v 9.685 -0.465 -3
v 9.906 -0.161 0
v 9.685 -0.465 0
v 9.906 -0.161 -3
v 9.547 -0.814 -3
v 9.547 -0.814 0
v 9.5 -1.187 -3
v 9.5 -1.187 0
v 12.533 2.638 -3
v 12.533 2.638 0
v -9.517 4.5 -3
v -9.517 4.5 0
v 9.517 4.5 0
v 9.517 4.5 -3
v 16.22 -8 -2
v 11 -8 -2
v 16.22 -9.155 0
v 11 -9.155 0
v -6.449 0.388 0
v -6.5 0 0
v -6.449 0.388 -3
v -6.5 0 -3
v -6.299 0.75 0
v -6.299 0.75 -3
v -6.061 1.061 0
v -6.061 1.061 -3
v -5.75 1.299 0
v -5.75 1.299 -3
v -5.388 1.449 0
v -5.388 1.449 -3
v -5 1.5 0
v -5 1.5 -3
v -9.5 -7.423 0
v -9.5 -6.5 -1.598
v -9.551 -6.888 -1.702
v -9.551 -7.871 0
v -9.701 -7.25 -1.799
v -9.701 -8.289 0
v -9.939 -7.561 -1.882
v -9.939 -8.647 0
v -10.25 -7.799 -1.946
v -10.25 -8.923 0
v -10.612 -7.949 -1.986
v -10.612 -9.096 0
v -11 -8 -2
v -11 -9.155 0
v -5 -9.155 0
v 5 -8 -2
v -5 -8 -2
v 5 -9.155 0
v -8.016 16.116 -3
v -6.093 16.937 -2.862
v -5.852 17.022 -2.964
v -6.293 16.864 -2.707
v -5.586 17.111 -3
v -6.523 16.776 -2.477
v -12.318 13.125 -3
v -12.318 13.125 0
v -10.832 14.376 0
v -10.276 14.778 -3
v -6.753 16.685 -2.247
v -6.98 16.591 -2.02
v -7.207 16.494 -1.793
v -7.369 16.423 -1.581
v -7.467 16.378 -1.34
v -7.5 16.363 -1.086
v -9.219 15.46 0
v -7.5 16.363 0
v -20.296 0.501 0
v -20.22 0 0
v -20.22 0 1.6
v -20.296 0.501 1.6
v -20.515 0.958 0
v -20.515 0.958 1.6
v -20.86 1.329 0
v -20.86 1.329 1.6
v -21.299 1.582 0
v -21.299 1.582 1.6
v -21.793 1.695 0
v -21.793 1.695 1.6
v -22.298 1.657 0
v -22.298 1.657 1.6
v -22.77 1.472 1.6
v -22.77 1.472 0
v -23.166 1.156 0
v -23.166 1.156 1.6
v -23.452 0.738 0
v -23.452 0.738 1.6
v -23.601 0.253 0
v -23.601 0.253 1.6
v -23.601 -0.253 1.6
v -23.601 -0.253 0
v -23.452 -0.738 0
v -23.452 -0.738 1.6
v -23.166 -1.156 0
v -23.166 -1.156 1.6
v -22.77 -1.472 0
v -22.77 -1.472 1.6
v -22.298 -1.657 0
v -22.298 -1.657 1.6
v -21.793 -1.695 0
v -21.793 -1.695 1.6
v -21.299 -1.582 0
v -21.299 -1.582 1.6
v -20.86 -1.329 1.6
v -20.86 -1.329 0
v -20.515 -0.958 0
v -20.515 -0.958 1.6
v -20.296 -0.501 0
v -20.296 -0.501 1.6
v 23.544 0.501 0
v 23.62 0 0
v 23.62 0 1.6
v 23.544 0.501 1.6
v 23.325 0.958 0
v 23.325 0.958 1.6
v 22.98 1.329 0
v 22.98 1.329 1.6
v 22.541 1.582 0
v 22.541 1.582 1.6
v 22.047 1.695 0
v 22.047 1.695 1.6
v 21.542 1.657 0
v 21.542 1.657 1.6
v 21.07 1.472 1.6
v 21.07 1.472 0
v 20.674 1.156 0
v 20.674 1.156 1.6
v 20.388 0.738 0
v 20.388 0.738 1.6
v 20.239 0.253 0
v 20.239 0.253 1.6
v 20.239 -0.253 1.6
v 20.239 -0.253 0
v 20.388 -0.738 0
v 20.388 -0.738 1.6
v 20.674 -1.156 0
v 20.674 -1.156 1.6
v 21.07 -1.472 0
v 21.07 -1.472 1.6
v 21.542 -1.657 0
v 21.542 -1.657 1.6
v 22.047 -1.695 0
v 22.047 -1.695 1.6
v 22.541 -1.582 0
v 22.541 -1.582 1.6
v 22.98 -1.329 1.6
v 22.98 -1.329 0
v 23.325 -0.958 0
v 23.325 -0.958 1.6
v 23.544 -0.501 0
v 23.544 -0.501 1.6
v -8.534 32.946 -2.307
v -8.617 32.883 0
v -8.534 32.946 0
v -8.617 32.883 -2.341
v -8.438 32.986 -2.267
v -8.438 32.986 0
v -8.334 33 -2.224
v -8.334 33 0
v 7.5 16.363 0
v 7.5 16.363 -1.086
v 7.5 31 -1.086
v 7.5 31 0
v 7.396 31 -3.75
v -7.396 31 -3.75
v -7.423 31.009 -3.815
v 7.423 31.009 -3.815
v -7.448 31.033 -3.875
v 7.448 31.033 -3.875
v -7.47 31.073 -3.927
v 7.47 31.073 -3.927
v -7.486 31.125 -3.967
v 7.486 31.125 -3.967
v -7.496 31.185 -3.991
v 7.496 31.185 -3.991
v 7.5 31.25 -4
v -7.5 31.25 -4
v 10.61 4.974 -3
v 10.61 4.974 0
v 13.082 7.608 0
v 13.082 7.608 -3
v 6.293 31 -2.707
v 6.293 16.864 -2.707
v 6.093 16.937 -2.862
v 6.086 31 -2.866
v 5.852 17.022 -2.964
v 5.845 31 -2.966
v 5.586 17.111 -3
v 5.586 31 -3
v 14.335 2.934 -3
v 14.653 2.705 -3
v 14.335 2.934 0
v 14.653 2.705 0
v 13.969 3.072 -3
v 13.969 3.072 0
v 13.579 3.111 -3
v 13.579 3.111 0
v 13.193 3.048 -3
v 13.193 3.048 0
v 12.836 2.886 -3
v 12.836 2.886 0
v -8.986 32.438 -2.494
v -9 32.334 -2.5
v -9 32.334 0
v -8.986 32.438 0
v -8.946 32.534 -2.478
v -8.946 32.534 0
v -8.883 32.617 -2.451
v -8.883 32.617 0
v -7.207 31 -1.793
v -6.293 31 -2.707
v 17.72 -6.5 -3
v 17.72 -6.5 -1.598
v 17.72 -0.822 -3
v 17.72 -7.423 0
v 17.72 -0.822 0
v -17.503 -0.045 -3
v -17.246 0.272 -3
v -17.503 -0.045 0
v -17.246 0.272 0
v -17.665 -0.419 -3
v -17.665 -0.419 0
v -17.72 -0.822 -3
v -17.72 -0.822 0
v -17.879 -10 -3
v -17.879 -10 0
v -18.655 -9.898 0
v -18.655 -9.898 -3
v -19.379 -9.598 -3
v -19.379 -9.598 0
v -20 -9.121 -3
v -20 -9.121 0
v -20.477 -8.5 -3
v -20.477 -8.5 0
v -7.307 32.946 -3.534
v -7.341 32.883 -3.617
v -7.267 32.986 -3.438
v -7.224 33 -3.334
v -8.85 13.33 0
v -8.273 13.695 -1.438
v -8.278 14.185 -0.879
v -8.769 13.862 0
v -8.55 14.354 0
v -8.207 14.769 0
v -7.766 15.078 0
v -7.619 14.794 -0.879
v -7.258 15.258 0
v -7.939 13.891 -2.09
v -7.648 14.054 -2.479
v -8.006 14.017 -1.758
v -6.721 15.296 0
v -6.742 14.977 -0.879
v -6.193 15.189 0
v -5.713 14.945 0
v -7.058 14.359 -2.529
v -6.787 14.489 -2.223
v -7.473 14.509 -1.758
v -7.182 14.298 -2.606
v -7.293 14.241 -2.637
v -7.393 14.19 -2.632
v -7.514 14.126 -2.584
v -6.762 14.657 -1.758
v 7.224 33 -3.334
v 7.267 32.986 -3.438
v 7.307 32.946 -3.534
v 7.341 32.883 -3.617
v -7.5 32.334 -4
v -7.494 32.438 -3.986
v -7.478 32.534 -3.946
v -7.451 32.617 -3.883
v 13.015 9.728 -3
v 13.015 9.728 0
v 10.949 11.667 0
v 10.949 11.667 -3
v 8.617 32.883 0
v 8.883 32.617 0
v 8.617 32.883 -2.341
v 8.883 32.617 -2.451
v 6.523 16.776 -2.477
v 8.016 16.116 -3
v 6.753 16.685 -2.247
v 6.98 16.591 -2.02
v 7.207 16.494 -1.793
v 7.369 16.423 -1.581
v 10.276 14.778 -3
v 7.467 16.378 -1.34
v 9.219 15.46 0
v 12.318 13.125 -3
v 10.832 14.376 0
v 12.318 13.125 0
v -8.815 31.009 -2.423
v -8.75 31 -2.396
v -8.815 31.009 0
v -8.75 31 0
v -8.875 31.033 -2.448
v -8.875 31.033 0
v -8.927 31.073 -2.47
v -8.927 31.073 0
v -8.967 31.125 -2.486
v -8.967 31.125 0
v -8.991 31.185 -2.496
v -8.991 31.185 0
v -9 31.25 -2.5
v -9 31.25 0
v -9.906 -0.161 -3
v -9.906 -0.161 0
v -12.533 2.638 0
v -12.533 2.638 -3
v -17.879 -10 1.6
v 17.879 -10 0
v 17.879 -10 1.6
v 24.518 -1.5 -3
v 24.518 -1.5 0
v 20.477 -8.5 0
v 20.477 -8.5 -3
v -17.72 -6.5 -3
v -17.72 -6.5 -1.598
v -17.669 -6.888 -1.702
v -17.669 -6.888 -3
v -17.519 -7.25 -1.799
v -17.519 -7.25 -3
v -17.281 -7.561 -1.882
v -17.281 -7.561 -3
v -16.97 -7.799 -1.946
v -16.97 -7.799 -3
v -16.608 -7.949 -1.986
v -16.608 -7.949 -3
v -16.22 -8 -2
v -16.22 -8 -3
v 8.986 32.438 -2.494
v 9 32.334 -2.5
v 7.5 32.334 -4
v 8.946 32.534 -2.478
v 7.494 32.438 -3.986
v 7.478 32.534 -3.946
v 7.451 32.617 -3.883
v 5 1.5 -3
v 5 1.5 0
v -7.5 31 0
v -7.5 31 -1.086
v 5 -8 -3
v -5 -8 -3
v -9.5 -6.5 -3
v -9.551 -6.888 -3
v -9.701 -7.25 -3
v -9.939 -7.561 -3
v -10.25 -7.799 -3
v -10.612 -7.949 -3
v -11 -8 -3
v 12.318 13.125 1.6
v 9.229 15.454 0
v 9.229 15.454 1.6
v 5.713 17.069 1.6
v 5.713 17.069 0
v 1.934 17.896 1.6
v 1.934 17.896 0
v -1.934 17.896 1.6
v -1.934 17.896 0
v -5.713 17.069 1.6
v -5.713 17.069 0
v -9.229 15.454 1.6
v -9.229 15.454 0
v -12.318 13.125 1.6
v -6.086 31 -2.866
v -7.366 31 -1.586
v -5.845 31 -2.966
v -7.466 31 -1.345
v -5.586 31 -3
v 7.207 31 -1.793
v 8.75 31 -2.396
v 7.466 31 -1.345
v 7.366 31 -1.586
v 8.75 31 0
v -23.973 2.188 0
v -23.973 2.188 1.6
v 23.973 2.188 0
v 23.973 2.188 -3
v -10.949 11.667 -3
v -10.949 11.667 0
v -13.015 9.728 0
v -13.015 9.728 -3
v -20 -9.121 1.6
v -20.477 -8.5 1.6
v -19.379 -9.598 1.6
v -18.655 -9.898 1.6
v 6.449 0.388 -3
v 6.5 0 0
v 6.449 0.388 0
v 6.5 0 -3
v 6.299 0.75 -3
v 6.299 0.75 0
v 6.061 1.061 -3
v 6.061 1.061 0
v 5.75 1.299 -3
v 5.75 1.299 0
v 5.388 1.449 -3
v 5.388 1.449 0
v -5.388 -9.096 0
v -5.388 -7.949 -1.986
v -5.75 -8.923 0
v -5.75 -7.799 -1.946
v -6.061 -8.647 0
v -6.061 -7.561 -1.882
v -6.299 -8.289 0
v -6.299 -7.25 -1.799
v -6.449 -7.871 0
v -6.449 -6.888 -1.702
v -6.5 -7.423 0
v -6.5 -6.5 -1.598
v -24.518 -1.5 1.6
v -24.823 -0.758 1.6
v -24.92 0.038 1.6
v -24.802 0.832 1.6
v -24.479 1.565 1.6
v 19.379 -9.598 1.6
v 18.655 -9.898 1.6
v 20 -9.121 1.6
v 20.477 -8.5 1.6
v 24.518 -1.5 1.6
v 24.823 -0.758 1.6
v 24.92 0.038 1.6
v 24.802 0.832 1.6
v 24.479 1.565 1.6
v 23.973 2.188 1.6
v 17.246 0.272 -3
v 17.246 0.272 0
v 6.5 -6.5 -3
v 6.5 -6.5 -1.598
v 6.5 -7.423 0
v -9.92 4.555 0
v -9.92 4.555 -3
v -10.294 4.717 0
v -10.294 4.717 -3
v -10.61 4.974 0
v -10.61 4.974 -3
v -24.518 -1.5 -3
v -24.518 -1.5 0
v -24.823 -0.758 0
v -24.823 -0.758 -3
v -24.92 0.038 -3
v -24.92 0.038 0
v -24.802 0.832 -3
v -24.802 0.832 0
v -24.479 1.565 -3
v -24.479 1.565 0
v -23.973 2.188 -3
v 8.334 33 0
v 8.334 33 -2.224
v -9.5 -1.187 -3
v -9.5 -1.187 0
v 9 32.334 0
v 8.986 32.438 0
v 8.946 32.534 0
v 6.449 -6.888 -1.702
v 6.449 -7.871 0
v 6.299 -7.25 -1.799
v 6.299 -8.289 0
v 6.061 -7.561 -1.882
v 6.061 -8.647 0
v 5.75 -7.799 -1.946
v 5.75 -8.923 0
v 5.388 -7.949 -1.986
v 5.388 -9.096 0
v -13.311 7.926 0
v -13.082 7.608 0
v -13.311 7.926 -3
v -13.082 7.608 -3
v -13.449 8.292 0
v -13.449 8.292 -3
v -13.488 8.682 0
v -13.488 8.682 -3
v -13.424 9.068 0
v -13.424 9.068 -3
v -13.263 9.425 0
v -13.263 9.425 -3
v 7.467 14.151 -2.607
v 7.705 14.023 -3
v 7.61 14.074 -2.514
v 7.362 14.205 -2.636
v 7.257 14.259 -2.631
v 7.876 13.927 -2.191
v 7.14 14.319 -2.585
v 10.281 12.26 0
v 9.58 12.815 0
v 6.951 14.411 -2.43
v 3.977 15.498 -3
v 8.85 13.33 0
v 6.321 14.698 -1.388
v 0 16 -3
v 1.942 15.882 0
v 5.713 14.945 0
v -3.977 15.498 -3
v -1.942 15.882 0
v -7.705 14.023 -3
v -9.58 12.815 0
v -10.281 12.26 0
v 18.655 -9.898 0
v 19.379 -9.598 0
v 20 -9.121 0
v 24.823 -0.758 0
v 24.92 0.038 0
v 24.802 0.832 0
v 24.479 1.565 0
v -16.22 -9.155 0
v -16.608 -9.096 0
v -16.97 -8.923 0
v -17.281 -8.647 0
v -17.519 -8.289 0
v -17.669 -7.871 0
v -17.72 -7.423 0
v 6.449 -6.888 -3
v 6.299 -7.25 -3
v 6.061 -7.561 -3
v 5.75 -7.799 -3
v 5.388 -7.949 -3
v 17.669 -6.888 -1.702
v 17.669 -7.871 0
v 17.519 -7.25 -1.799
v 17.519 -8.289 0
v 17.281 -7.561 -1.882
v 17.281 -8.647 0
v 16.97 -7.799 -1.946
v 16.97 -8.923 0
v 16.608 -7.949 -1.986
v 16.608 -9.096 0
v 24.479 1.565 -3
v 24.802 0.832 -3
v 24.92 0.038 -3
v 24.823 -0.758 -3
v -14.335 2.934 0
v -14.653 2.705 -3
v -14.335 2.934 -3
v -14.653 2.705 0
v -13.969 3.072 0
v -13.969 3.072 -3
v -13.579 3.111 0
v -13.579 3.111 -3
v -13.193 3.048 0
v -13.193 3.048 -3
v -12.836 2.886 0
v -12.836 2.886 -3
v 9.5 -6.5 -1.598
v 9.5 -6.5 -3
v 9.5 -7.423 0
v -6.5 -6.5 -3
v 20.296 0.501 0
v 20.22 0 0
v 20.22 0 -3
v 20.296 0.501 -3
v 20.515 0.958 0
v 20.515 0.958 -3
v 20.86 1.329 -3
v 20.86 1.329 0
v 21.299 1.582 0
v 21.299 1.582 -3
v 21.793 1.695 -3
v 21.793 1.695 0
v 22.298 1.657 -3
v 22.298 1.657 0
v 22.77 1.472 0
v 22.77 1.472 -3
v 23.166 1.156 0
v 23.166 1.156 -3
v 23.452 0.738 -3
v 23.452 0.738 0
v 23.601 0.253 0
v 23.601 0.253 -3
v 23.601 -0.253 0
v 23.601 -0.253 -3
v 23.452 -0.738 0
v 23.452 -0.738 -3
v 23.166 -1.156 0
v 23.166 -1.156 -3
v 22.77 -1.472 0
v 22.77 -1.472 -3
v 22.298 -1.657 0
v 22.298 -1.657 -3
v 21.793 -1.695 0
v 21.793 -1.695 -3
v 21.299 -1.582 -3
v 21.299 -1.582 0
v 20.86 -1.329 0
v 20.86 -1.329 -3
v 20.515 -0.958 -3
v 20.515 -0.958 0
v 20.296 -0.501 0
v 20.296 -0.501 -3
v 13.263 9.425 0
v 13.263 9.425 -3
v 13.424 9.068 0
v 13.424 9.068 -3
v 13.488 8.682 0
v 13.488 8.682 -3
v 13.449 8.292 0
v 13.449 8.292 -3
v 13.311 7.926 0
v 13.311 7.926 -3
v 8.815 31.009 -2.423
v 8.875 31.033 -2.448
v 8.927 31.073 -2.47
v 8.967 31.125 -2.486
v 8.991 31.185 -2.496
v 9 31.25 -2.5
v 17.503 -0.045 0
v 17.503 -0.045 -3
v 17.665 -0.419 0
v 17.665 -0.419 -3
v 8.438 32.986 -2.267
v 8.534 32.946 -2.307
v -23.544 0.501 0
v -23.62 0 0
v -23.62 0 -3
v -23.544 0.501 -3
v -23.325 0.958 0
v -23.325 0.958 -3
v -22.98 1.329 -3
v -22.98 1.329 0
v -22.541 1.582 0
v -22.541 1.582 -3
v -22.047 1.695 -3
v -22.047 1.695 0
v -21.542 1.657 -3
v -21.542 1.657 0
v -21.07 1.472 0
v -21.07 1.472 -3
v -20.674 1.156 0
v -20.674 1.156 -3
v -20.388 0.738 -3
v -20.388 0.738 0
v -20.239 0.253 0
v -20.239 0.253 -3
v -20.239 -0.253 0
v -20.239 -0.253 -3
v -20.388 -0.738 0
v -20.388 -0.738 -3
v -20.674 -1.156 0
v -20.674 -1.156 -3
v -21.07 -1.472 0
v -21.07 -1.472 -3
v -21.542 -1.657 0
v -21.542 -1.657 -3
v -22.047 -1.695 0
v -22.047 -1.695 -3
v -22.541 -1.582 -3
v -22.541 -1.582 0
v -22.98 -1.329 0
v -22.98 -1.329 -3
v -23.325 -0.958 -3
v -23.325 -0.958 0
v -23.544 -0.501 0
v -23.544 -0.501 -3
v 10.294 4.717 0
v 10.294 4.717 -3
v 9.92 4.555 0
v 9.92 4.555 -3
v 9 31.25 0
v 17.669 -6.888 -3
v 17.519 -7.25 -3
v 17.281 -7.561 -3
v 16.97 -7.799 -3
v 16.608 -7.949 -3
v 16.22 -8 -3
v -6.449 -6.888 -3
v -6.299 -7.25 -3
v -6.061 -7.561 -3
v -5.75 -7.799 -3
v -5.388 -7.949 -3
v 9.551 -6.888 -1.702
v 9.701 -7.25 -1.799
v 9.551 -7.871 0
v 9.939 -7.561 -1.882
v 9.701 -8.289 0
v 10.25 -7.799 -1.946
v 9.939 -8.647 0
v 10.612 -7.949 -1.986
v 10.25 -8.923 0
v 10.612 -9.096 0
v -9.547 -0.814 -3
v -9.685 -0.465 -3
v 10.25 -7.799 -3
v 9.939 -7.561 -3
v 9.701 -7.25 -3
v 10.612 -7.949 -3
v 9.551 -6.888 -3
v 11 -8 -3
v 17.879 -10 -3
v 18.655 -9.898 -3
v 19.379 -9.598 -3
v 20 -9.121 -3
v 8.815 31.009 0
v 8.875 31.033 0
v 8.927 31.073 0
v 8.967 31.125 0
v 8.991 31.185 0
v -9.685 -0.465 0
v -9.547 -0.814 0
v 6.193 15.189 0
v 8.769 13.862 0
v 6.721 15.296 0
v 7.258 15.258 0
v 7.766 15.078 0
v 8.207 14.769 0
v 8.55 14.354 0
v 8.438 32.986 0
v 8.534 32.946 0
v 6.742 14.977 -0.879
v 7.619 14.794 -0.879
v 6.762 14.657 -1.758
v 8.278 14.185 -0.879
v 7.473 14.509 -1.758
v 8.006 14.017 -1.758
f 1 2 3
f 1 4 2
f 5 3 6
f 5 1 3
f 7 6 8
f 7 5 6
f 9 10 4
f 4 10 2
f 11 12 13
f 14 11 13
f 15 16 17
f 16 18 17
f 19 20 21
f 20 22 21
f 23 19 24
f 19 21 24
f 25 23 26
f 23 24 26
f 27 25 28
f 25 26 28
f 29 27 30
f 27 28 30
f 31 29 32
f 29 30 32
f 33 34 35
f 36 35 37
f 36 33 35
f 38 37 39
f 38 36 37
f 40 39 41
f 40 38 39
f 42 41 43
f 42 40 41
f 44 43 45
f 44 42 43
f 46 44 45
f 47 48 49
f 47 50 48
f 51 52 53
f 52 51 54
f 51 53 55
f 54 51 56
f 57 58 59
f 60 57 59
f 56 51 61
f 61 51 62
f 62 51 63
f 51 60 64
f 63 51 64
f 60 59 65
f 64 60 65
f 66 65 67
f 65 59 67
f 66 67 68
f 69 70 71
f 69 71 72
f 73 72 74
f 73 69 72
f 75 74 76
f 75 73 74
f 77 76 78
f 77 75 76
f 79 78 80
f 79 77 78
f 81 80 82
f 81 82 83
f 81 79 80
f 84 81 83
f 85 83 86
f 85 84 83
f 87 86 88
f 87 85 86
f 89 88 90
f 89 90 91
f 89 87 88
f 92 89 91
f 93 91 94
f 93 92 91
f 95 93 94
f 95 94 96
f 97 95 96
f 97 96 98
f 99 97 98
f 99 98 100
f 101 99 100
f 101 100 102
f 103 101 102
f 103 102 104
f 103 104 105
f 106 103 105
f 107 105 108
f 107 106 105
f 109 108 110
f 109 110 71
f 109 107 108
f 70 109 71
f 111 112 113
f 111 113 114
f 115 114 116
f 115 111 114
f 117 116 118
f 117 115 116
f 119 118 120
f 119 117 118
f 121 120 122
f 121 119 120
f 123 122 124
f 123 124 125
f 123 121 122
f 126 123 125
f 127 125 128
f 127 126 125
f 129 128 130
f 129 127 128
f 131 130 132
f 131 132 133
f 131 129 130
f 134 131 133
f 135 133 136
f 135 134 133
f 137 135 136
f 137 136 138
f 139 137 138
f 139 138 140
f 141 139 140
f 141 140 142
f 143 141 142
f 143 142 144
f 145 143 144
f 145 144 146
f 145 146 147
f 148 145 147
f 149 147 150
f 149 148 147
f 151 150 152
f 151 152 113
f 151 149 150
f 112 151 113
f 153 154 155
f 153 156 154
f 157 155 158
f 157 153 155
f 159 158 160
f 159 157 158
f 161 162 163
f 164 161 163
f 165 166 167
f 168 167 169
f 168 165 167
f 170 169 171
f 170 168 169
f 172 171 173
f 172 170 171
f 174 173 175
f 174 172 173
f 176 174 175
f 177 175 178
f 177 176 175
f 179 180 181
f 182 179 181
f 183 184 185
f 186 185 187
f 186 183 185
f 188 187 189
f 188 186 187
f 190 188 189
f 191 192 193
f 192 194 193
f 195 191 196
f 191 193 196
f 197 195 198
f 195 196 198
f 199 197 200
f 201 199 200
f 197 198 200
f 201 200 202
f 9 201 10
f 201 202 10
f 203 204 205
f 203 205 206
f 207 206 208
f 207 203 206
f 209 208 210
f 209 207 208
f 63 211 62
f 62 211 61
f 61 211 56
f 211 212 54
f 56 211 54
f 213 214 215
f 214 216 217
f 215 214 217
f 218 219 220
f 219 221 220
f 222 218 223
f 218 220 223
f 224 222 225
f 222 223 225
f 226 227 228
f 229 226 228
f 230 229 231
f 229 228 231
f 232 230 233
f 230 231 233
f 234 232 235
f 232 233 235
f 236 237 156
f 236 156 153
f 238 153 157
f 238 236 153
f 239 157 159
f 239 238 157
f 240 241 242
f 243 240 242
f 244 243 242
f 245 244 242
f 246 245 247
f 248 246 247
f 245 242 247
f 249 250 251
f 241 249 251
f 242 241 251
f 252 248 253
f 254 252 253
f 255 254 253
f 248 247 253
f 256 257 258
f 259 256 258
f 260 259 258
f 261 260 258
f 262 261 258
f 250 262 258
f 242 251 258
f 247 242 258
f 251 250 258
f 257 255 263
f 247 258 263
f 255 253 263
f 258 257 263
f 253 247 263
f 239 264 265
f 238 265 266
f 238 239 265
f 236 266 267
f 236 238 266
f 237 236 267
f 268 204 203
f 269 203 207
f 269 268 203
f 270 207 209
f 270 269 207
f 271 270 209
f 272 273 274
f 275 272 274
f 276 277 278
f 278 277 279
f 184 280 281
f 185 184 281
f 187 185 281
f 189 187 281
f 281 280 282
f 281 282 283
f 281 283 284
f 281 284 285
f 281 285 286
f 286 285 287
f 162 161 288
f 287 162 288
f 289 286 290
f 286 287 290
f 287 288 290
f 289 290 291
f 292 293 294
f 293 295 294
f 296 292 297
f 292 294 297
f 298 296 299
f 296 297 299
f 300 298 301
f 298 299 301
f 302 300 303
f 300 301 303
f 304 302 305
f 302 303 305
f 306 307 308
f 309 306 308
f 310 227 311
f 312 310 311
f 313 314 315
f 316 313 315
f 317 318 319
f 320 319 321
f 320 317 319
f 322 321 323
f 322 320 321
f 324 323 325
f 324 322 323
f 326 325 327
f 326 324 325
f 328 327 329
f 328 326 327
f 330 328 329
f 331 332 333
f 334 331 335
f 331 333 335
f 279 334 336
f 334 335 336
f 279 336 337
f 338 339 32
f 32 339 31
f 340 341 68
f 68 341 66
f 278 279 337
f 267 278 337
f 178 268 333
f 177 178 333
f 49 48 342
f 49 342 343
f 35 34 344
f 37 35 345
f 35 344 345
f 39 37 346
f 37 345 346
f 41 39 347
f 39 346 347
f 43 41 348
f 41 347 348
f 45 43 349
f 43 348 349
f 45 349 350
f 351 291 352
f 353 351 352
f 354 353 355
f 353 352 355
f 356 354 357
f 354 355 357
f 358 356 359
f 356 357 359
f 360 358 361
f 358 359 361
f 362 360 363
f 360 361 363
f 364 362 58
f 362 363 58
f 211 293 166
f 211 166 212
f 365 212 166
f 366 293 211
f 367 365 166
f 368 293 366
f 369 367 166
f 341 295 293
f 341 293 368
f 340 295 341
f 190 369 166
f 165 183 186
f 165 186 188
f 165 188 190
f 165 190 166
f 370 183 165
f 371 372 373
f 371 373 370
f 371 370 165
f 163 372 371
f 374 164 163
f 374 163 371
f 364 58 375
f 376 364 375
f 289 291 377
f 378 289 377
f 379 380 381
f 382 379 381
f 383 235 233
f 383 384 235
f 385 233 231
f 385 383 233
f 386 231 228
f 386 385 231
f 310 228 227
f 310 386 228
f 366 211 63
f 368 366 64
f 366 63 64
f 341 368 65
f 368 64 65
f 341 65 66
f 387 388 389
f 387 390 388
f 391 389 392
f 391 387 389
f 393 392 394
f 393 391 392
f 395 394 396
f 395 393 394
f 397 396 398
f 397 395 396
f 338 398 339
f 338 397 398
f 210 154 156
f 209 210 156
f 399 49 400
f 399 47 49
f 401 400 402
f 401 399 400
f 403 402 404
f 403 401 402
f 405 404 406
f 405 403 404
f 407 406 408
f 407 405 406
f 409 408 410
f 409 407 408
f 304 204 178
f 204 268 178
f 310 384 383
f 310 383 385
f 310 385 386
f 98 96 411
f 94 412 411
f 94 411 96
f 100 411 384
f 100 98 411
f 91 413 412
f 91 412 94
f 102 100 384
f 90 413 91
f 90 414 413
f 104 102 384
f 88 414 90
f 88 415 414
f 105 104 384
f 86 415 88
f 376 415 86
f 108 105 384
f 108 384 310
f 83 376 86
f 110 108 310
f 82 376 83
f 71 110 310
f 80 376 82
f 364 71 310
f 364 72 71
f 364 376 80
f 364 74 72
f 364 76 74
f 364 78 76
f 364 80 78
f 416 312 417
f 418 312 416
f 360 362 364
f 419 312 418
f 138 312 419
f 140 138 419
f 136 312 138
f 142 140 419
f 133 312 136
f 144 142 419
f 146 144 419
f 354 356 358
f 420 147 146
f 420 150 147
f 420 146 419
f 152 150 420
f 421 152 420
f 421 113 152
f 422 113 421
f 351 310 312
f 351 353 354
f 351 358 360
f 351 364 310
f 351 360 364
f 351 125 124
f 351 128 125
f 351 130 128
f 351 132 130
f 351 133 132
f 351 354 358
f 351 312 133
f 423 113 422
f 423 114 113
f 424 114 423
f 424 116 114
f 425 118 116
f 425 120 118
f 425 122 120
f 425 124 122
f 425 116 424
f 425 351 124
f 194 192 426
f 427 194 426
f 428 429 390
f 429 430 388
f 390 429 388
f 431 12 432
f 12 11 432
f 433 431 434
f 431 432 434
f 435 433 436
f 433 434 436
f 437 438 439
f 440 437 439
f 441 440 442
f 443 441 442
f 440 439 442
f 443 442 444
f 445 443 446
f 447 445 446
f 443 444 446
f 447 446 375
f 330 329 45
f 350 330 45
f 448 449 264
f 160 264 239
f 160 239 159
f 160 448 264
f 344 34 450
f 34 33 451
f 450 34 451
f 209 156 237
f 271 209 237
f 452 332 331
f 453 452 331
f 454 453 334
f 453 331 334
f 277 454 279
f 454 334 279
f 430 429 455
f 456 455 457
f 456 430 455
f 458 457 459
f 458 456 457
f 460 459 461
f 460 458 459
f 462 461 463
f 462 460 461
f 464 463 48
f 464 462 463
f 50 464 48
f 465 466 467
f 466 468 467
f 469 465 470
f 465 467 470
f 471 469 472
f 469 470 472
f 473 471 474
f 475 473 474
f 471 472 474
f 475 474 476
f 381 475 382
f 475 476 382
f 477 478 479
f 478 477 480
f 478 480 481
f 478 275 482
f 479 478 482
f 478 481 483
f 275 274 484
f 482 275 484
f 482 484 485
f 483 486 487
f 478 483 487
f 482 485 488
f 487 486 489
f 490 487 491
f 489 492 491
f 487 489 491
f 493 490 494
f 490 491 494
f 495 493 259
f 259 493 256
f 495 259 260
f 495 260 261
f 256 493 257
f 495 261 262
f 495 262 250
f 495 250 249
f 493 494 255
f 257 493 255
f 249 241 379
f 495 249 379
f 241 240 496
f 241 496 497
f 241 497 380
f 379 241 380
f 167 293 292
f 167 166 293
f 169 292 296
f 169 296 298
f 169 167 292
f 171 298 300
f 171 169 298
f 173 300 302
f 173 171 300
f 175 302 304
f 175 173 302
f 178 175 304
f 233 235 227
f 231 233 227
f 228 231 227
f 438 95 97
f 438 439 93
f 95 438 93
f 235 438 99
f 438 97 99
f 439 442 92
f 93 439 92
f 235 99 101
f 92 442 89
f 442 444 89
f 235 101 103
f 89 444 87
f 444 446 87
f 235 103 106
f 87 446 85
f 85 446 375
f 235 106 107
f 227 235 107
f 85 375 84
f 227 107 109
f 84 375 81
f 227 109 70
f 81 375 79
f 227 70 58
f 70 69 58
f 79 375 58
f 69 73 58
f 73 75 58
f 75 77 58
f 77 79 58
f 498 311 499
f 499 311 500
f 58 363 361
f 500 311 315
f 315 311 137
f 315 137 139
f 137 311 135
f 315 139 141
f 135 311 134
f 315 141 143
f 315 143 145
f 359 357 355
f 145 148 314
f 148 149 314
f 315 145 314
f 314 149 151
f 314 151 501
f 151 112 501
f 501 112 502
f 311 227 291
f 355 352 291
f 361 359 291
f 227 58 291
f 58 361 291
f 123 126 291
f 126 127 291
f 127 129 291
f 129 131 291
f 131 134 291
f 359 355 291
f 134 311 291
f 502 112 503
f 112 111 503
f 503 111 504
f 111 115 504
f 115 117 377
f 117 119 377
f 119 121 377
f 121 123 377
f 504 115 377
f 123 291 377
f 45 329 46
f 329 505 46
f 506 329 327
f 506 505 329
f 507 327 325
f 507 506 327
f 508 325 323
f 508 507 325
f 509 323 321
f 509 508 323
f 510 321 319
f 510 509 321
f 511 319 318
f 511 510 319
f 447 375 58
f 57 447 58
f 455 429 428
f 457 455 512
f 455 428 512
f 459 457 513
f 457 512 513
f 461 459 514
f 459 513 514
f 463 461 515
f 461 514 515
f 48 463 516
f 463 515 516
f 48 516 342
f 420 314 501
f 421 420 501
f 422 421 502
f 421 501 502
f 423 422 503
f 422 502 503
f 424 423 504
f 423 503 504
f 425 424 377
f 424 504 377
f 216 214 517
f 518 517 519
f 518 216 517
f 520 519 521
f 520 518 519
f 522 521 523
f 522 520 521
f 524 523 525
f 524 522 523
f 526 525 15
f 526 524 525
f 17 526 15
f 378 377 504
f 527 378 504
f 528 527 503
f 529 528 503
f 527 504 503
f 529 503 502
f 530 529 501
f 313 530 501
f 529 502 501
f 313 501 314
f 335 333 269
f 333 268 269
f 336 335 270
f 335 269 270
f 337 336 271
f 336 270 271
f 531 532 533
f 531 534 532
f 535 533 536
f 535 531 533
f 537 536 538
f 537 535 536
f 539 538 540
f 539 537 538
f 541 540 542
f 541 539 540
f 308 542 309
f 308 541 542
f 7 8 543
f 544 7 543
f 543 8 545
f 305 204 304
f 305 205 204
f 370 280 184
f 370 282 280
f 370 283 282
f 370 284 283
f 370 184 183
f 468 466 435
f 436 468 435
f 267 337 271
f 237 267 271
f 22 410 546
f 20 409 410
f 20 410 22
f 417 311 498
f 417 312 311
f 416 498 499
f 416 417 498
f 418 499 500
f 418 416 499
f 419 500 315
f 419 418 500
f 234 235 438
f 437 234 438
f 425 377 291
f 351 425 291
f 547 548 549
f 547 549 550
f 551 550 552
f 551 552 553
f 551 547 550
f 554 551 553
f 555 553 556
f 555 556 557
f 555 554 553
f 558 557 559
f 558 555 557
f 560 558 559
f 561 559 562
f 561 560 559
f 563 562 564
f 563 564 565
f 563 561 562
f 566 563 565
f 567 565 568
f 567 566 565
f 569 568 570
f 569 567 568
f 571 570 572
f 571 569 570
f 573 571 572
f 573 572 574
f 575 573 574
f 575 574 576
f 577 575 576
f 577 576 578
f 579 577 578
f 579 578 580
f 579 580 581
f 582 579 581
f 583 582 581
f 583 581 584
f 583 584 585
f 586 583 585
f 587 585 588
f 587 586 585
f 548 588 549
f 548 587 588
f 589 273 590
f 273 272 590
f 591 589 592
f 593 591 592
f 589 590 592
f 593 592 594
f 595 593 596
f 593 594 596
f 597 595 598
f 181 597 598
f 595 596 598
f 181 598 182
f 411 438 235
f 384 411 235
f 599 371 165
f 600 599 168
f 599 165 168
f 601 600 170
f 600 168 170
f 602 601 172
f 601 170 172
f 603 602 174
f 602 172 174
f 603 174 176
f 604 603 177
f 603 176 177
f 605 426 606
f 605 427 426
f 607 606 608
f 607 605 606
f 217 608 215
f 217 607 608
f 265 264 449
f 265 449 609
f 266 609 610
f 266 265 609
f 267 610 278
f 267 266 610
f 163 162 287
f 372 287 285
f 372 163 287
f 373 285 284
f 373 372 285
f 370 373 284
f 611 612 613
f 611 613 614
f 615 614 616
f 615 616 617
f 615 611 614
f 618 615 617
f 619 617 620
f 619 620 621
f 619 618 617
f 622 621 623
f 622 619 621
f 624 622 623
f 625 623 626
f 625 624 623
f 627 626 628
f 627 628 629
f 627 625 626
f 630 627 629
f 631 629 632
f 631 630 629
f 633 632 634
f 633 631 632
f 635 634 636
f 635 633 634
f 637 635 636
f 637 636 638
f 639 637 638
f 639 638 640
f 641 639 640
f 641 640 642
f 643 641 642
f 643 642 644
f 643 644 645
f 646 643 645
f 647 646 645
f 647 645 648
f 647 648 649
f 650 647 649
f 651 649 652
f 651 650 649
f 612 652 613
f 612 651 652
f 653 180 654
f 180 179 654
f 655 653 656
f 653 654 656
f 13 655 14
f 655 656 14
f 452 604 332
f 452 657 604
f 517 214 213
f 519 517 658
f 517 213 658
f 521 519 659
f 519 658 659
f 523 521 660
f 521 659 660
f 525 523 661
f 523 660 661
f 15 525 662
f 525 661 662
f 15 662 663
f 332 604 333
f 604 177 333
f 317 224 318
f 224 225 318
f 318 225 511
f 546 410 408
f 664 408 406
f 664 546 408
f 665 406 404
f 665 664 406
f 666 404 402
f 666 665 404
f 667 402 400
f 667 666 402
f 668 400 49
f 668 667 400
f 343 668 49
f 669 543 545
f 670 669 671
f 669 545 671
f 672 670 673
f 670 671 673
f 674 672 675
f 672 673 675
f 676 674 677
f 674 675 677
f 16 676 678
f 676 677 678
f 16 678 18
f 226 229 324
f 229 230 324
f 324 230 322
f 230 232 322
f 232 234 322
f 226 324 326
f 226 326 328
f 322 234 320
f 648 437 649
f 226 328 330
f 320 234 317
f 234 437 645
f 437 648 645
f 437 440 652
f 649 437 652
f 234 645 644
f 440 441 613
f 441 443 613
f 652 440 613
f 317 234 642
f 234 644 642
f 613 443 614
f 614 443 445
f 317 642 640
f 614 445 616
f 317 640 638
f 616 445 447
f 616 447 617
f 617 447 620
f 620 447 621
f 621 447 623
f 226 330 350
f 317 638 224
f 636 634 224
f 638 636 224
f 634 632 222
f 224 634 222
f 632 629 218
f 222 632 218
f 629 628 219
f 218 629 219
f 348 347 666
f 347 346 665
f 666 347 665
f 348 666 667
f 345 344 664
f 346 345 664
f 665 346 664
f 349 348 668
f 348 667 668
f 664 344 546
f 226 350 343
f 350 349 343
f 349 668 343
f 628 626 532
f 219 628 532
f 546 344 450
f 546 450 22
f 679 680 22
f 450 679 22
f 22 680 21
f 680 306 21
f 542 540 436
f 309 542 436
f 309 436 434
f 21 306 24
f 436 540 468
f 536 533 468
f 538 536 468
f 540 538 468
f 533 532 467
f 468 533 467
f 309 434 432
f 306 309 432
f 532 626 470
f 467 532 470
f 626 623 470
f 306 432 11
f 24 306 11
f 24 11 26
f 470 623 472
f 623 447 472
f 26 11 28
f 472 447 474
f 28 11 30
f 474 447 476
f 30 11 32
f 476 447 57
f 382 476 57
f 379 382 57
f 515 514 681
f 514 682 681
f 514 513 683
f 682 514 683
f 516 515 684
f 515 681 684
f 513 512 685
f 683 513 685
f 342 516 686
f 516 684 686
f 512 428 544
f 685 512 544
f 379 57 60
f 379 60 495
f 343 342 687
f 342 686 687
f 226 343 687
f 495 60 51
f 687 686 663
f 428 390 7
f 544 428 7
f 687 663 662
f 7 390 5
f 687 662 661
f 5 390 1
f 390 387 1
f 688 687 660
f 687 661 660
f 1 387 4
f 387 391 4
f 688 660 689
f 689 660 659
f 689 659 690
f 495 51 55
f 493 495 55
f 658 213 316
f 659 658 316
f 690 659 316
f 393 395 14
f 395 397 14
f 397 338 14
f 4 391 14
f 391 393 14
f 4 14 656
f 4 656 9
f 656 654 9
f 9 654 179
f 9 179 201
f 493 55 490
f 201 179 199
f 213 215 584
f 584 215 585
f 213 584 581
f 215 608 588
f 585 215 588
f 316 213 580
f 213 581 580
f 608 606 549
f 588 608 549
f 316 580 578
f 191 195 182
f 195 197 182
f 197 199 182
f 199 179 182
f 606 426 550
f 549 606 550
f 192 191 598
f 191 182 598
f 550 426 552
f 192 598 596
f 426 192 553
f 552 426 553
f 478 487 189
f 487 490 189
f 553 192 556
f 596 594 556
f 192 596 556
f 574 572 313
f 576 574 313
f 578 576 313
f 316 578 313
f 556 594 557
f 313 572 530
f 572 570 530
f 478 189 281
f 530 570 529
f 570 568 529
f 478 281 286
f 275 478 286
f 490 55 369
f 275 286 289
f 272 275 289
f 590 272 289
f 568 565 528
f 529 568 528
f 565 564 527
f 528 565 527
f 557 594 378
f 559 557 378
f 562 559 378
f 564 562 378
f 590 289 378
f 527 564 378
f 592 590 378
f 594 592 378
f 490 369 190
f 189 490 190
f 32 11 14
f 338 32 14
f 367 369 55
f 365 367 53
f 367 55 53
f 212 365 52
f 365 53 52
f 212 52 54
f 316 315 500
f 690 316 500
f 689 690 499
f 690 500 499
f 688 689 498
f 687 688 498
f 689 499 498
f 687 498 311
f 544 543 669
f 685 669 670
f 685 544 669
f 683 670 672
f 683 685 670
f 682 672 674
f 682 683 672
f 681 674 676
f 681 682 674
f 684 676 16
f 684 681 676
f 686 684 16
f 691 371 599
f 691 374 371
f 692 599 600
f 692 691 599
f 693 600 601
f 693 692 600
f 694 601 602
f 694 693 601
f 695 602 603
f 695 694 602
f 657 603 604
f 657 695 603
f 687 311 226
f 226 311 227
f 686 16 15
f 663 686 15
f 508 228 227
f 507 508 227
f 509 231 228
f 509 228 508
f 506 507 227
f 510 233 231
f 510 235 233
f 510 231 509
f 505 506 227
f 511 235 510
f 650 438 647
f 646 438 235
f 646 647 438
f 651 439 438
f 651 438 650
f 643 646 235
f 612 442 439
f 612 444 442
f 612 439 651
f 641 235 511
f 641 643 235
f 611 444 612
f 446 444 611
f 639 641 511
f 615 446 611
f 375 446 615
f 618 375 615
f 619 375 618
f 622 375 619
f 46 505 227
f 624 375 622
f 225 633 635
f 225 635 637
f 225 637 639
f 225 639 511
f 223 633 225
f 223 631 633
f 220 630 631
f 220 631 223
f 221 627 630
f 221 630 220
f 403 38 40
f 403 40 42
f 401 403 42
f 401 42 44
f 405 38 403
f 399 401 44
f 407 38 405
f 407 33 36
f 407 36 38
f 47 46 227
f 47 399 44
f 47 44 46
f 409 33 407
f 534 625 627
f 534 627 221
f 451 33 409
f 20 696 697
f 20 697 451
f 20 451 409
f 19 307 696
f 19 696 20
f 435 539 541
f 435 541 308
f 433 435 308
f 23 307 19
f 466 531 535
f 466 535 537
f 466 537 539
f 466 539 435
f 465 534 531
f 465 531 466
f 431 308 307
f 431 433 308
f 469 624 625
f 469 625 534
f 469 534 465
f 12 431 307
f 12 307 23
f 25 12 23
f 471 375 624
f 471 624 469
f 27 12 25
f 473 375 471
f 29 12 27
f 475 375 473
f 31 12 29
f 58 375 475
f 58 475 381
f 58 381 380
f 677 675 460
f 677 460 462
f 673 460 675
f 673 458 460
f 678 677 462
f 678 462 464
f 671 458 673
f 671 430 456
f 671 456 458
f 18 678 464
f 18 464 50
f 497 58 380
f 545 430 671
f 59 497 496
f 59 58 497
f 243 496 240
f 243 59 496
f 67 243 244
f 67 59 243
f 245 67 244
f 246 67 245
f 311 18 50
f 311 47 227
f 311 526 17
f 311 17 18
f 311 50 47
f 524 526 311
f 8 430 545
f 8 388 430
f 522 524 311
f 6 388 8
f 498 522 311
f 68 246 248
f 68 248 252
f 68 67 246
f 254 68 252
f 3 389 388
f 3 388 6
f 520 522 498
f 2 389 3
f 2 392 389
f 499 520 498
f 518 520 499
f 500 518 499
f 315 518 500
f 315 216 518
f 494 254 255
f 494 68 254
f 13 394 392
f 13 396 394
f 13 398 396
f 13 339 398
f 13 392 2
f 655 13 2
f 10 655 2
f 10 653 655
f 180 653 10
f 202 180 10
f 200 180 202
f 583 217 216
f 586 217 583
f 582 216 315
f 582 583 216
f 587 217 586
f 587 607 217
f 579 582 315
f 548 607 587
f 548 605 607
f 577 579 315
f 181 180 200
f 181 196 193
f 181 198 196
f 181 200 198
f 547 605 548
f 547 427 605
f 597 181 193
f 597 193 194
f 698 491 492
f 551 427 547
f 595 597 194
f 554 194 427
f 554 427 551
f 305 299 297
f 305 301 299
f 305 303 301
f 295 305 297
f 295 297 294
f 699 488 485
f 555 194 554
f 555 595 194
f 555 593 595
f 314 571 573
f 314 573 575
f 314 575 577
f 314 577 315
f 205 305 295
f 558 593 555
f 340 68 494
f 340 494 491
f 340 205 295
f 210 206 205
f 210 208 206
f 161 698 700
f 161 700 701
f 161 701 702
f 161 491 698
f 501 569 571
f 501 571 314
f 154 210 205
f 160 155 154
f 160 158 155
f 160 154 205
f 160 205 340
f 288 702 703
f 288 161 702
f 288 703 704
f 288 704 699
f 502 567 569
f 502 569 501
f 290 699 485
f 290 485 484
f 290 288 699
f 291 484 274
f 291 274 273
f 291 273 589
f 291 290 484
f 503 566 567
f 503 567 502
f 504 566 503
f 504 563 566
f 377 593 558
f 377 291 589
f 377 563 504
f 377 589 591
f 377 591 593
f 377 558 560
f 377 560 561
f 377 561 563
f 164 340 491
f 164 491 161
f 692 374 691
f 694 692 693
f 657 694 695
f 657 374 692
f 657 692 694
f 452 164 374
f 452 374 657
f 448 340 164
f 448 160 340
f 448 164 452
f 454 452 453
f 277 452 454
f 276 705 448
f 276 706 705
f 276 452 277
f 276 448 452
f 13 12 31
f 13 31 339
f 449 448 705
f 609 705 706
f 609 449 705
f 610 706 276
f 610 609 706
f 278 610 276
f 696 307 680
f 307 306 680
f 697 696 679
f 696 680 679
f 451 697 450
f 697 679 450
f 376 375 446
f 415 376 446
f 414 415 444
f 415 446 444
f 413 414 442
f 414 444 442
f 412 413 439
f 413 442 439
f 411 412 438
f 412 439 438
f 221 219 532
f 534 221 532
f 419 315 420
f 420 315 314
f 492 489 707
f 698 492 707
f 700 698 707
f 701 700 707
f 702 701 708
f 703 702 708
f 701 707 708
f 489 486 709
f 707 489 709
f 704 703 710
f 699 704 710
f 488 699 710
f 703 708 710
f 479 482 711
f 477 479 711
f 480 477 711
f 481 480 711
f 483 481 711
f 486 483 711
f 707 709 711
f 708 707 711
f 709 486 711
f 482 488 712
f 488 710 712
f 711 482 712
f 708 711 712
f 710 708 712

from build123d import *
from OCP.BRepFilletAPI import BRepFilletAPI_MakeChamfer

# Parameters (mm, degrees)
SKETCH1_R           = 1.7
BOSS_EXTRUDE1_DEPTH = 1.6
FILLET3_R           = 3
SKETCH2_R           = 1.7
SKETCH2_W           = 13
SKETCH2_H           = 9.5
BOSS_EXTRUDE2_DEPTH = 3
CHAMFER1_SIZE       = 2
CHAMFER1_SIZE2      = 1.154700538
MOVE_START          = -3
MOVE_FACE2_DEPTH    = 3
MOVE_FACE3_DEPTH    = 3
FILLET2_R           = 1.5
BOSS_EXTRUDE3_START = -3
BOSS_EXTRUDE3_DEPTH = 3
BOSS_EXTRUDE4_START = -3
BOSS_EXTRUDE4_DEPTH = 1
CHAMFER6_SIZE       = 1.5
CHAMFER3_SIZE       = 0.5
FILLET6_R           = 0.4
CHAMFER5_SIZE       = 1.5
FILLET7_R           = 1
FILLET8_R           = 0.25


# Read off the part's stored shape, not the designer's step: Move Face2, Move Face3
with BuildPart() as part:
    # Sketch1 → Boss-Extrude1 (new body)
    with BuildSketch(Plane.XY):
        with BuildLine():
            Line((-12.317518248, 13.12549977), (-23.972919708, 2.187583295))
            ThreePointArc((-23.972919708, 2.187583295), (-24.887744666, 0.438738647), (-24.518076211, -1.5))
            Line((-24.518076211, -1.5), (-19.610598923, -10))
            Line((-19.610598923, -10), (19.610598923, -10))
            Line((19.610598923, -10), (24.518076211, -1.5))
            ThreePointArc((24.518076211, -1.5), (24.887744666, 0.438738647), (23.972919708, 2.187583295))
            Line((23.972919708, 2.187583295), (12.317518248, 13.12549977))
            ThreePointArc((12.317518248, 13.12549977), (0, 18), (-12.317518248, 13.12549977))
        make_face()
        with Locations((-21.92, 0)):
            Circle(SKETCH1_R, mode=Mode.SUBTRACT)
        with Locations((21.92, 0)):
            Circle(SKETCH1_R, mode=Mode.SUBTRACT)
    extrude(amount=BOSS_EXTRUDE1_DEPTH)

    # Fillet3
    fillet3_edges = [part.edges().sort_by_distance(p)[0] for p in [
        (19.610598923, -10, 0.8),
        (-19.610598923, -10, 0.8),
    ]]
    fillet(fillet3_edges, radius=FILLET3_R)


with BuildPart() as body_2:
    # Sketch2 → Boss-Extrude2 (new body)
    with BuildSketch(Plane(origin=(0, 0, 0), x_dir=(-1, 0, 0), z_dir=(0, 0, -1))):
        with BuildLine():
            ThreePointArc((-20.476624327, -8.5), (-19.378548116, -9.598076211), (-17.878548116, -10))
            Line((-17.878548116, -10), (17.878548116, -10))
            ThreePointArc((17.878548116, -10), (19.378548116, -9.598076211), (20.476624327, -8.5))
            Line((20.476624327, -8.5), (24.518076211, -1.5))
            ThreePointArc((24.518076211, -1.5), (24.887744666, 0.438738647), (23.972919708, 2.187583295))
            Line((23.972919708, 2.187583295), (12.317518248, 13.12549977))
            ThreePointArc((12.317518248, 13.12549977), (0, 18), (-12.317518248, 13.12549977))
            Line((-12.317518248, 13.12549977), (-23.972919708, 2.187583295))
            ThreePointArc((-23.972919708, 2.187583295), (-24.887744666, 0.438738647), (-24.518076211, -1.5))
            Line((-24.518076211, -1.5), (-20.476624327, -8.5))
        make_face()
        with BuildLine():
            Line((10.165923783, 4.5), (-10.165923783, 4.5))
            Line((-10.165923783, 4.5), (-14.108909615, 8.701630441))
            Line((-14.108909615, 8.701630441), (-10.948905109, 11.667110906))
            ThreePointArc((-10.948905109, 11.667110906), (0, 16), (10.948905109, 11.667110906))
            Line((10.948905109, 11.667110906), (14.108909615, 8.701630441))
            Line((14.108909615, 8.701630441), (10.165923783, 4.5))
        make_face(mode=Mode.SUBTRACT)
        with BuildLine():
            Line((-16.29649291, 6.648710733), (-9.5, -0.593605806))
            Line((-9.5, -0.593605806), (-9.5, -8))
            Line((-9.5, -8), (-17.72, -8))
            Line((-17.72, -8), (-17.72, 0))
            ThreePointArc((-17.72, 0), (-18.228185683, 2.002625039), (-19.62976526, 3.520628472))
            Line((-19.62976526, 3.520628472), (-16.29649291, 6.648710733))
        make_face(mode=Mode.SUBTRACT)
        with BuildLine():
            Line((17.72, -8), (9.5, -8))
            Line((9.5, -8), (9.5, -0.593605806))
            Line((9.5, -0.593605806), (16.29649291, 6.648710733))
            Line((16.29649291, 6.648710733), (19.62976526, 3.520628472))
            ThreePointArc((19.62976526, 3.520628472), (18.228185683, 2.002625039), (17.72, 0))
            Line((17.72, 0), (17.72, -8))
        make_face(mode=Mode.SUBTRACT)
        with Locations((21.92, 0)):
            Circle(SKETCH2_R, mode=Mode.SUBTRACT)
        with Locations((0, -3.25)):
            Rectangle(SKETCH2_W, SKETCH2_H, mode=Mode.SUBTRACT)
        with Locations((-21.92, 0)):
            Circle(SKETCH2_R, mode=Mode.SUBTRACT)
    extrude(amount=BOSS_EXTRUDE2_DEPTH)

    # Cut-Extrude1 cone 1 section (through the dimple's axis) → Cut-Extrude1 (revolve, cut)
    with BuildSketch(Plane(origin=(-6.85, 13.3, 0), x_dir=(0, -1, 0), z_dir=(1, 0, 0))):
        Polygon((0, 0), (2, 0), (0, 5.494954839), align=None)
    revolve(axis=Axis((-6.85, 13.3, 0), (0, 0, -1)), mode=Mode.SUBTRACT)

    # Cut-Extrude1 cone 2 section (through the dimple's axis) → Cut-Extrude1 cone 2 (revolve, cut)
    with BuildSketch(Plane(origin=(6.85, 13.3, 0), x_dir=(0, -1, 0), z_dir=(1, 0, 0))):
        Polygon((0, 0), (2, 0), (0, 5.494954839), align=None)
    revolve(axis=Axis((6.85, 13.3, 0), (0, 0, -1)), mode=Mode.SUBTRACT)

    # Chamfer1: one chamfer whose edges measure the first distance from different faces: ONE call of the kernel's chamfer builder (chamfer() names one face for all edges)
    chamfer1_edges_1 = [body_2.edges().sort_by_distance(p)[0] for p in [
        (-13.61, -8, 0),
    ]]
    chamfer1_side_1 = [body_2.faces().sort_by_distance(p)[0] for p in [
        (-13.61, -8, -1.5),
    ]]
    chamfer1_edges_2 = [body_2.edges().sort_by_distance(p)[0] for p in [
        (0, -8, 0),
    ]]
    chamfer1_side_2 = [body_2.faces().sort_by_distance(p)[0] for p in [
        (0, -8, -1.5),
    ]]
    chamfer1_edges_3 = [body_2.edges().sort_by_distance(p)[0] for p in [
        (13.61, -8, 0),
    ]]
    chamfer1_side_3 = [body_2.faces().sort_by_distance(p)[0] for p in [
        (13.61, -8, -1.5),
    ]]
    chamfer1 = BRepFilletAPI_MakeChamfer(body_2.part.solid().wrapped)
    for e in chamfer1_edges_1:
        chamfer1.Add(CHAMFER1_SIZE, CHAMFER1_SIZE2, e.wrapped, chamfer1_side_1[0].wrapped)  # the first distance lies on this face
    for e in chamfer1_edges_2:
        chamfer1.Add(CHAMFER1_SIZE, CHAMFER1_SIZE2, e.wrapped, chamfer1_side_2[0].wrapped)  # the first distance lies on this face
    for e in chamfer1_edges_3:
        chamfer1.Add(CHAMFER1_SIZE, CHAMFER1_SIZE2, e.wrapped, chamfer1_side_3[0].wrapped)  # the first distance lies on this face
    add(Compound.cast(chamfer1.Shape()), mode=Mode.REPLACE)

    # Move Face2 outline → Move Face2 (add)
    with BuildSketch(Plane.XY.offset(MOVE_START)):
        with BuildLine():
            Line((-17.72, 0), (-17.72, -0.1726733))
            Line((-17.72, -0.1726733), (-13.559266633, 3.731933007))
            Line((-13.559266633, 3.731933007), (-16.29649291, 6.648710733))
            Line((-16.29649291, 6.648710733), (-19.62976526, 3.520628472))
            ThreePointArc((-19.62976526, 3.520628472), (-18.228185683, 2.002625039), (-17.72, 0))
        make_face()
    extrude(amount=MOVE_FACE2_DEPTH)

    # Move Face3 outline → Move Face3 (add)
    with BuildSketch(Plane.XY.offset(MOVE_START)):
        with BuildLine():
            Line((16.29649291, 6.648710733), (13.559266633, 3.731933007))
            Line((13.559266633, 3.731933007), (17.72, -0.1726733))
            Line((17.72, -0.1726733), (17.72, 0))
            ThreePointArc((17.72, 0), (18.228185683, 2.002625039), (19.62976526, 3.520628472))
            Line((19.62976526, 3.520628472), (16.29649291, 6.648710733))
        make_face()
    extrude(amount=MOVE_FACE3_DEPTH)

    # Fillet2
    fillet2_edges = [body_2.edges().sort_by_distance(p)[0] for p in [
        (9.5, -8.577350269, -1),
        (17.72, -8.577350269, -1),
        (-6.5, -8.577350269, -1),
        (6.5, -8.577350269, -1),
        (-17.72, -8.577350269, -1),
        (-9.5, -8.577350269, -1),
        (-17.72, -0.1726733, -1.5),
        (17.72, -0.1726733, -1.5),
        (-10.165923783, 4.5, -1.5),
        (-14.108909615, 8.701630441, -1.5),
        (14.108909615, 8.701630441, -1.5),
        (10.165923783, 4.5, -1.5),
        (-13.559266633, 3.731933007, -1.5),
        (-9.5, -0.593605806, -1.5),
        (-9.5, -8, -2.5),
        (-17.72, -8, -2.5),
        (6.5, -8, -2.5),
        (-6.5, -8, -2.5),
        (-6.5, 1.5, -1.5),
        (6.5, 1.5, -1.5),
        (17.72, -8, -2.5),
        (9.5, -8, -2.5),
        (9.5, -0.593605806, -1.5),
        (13.559266633, 3.731933007, -1.5),
    ]]
    fillet(fillet2_edges, radius=FILLET2_R)

    # Sketch4 → Boss-Extrude3 (add)
    with BuildSketch(Plane.XY.offset(BOSS_EXTRUDE3_START)):
        with BuildLine():
            ThreePointArc((-7.5, 16.363068172), (0, 18), (7.5, 16.363068172))
            Line((7.5, 16.363068172), (7.5, 31))
            Line((7.5, 31), (9, 31))
            Line((9, 31), (9, 33))
            Line((9, 33), (-9, 33))
            Line((-9, 33), (-9, 31))
            Line((-9, 31), (-7.5, 31))
            Line((-7.5, 31), (-7.5, 16.363068172))
        make_face()
    extrude(amount=BOSS_EXTRUDE3_DEPTH)

    # Sketch4<3> → Boss-Extrude4 (add)
    with BuildSketch(Plane.XY.offset(BOSS_EXTRUDE4_START)):
        Polygon((-7.5, 31), (0, 31), (0, 33), (-9, 33), (-9, 31), align=None)
        Polygon((0, 33), (0, 31), (7.5, 31), (9, 31), (9, 33), align=None)
    extrude(amount=-BOSS_EXTRUDE4_DEPTH)

    # Chamfer6
    chamfer6_edges = [body_2.edges().sort_by_distance(p)[0] for p in [
        (9, 32, -4),
        (-9, 32, -4),
    ]]
    chamfer(chamfer6_edges, length=CHAMFER6_SIZE)

    # Chamfer3
    chamfer3_edges = [body_2.edges().sort_by_distance(p)[0] for p in [
        (0, 33, -4),
        (9, 33, -1.25),
        (-9, 33, -1.25),
        (8.25, 33, -3.25),
        (-8.25, 33, -3.25),
    ]]
    chamfer(chamfer3_edges, length=CHAMFER3_SIZE)

    # Fillet6
    fillet6_edges = [body_2.edges().sort_by_distance(p)[0] for p in [
        (9, 32.5, -1.25),
        (-8.5, 33, -1.146446609),
        (-7.896446609, 33, -2.896446609),
        (0, 33, -3.5),
        (7.896446609, 33, -2.896446609),
        (8.5, 33, -1.146446609),
        (8.25, 32.5, -3.25),
        (0, 32.5, -4),
        (-8.25, 32.5, -3.25),
        (-9, 32.5, -1.25),
    ]]
    fillet(fillet6_edges, radius=FILLET6_R)

    # Chamfer5
    chamfer5_edges = [body_2.edges().sort_by_distance(p)[0] for p in [
        (7.5, 23.681534086, -3),
        (-7.5, 23.681534086, -3),
    ]]
    chamfer(chamfer5_edges, length=CHAMFER5_SIZE)

    # Fillet7
    fillet7_edges = [body_2.edges().sort_by_distance(p)[0] for p in [
        (6, 23.985281374, -3),
        (-6, 23.985281374, -3),
        (7.5, 23.681534086, -1.5),
        (-7.5, 23.681534086, -1.5),
    ]]
    fillet(fillet7_edges, radius=FILLET7_R)

    # Fillet8
    fillet8_edges = [body_2.edges().sort_by_distance(p)[0] for p in [
        (0, 31, -4),
        (-9, 31, -1.25),
        (9, 31, -1.25),
        (8.25, 31, -3.25),
        (-8.25, 31, -3.25),
    ]]
    fillet(fillet8_edges, radius=FILLET8_R)


solid = Compound([part.part, body_2.part])
